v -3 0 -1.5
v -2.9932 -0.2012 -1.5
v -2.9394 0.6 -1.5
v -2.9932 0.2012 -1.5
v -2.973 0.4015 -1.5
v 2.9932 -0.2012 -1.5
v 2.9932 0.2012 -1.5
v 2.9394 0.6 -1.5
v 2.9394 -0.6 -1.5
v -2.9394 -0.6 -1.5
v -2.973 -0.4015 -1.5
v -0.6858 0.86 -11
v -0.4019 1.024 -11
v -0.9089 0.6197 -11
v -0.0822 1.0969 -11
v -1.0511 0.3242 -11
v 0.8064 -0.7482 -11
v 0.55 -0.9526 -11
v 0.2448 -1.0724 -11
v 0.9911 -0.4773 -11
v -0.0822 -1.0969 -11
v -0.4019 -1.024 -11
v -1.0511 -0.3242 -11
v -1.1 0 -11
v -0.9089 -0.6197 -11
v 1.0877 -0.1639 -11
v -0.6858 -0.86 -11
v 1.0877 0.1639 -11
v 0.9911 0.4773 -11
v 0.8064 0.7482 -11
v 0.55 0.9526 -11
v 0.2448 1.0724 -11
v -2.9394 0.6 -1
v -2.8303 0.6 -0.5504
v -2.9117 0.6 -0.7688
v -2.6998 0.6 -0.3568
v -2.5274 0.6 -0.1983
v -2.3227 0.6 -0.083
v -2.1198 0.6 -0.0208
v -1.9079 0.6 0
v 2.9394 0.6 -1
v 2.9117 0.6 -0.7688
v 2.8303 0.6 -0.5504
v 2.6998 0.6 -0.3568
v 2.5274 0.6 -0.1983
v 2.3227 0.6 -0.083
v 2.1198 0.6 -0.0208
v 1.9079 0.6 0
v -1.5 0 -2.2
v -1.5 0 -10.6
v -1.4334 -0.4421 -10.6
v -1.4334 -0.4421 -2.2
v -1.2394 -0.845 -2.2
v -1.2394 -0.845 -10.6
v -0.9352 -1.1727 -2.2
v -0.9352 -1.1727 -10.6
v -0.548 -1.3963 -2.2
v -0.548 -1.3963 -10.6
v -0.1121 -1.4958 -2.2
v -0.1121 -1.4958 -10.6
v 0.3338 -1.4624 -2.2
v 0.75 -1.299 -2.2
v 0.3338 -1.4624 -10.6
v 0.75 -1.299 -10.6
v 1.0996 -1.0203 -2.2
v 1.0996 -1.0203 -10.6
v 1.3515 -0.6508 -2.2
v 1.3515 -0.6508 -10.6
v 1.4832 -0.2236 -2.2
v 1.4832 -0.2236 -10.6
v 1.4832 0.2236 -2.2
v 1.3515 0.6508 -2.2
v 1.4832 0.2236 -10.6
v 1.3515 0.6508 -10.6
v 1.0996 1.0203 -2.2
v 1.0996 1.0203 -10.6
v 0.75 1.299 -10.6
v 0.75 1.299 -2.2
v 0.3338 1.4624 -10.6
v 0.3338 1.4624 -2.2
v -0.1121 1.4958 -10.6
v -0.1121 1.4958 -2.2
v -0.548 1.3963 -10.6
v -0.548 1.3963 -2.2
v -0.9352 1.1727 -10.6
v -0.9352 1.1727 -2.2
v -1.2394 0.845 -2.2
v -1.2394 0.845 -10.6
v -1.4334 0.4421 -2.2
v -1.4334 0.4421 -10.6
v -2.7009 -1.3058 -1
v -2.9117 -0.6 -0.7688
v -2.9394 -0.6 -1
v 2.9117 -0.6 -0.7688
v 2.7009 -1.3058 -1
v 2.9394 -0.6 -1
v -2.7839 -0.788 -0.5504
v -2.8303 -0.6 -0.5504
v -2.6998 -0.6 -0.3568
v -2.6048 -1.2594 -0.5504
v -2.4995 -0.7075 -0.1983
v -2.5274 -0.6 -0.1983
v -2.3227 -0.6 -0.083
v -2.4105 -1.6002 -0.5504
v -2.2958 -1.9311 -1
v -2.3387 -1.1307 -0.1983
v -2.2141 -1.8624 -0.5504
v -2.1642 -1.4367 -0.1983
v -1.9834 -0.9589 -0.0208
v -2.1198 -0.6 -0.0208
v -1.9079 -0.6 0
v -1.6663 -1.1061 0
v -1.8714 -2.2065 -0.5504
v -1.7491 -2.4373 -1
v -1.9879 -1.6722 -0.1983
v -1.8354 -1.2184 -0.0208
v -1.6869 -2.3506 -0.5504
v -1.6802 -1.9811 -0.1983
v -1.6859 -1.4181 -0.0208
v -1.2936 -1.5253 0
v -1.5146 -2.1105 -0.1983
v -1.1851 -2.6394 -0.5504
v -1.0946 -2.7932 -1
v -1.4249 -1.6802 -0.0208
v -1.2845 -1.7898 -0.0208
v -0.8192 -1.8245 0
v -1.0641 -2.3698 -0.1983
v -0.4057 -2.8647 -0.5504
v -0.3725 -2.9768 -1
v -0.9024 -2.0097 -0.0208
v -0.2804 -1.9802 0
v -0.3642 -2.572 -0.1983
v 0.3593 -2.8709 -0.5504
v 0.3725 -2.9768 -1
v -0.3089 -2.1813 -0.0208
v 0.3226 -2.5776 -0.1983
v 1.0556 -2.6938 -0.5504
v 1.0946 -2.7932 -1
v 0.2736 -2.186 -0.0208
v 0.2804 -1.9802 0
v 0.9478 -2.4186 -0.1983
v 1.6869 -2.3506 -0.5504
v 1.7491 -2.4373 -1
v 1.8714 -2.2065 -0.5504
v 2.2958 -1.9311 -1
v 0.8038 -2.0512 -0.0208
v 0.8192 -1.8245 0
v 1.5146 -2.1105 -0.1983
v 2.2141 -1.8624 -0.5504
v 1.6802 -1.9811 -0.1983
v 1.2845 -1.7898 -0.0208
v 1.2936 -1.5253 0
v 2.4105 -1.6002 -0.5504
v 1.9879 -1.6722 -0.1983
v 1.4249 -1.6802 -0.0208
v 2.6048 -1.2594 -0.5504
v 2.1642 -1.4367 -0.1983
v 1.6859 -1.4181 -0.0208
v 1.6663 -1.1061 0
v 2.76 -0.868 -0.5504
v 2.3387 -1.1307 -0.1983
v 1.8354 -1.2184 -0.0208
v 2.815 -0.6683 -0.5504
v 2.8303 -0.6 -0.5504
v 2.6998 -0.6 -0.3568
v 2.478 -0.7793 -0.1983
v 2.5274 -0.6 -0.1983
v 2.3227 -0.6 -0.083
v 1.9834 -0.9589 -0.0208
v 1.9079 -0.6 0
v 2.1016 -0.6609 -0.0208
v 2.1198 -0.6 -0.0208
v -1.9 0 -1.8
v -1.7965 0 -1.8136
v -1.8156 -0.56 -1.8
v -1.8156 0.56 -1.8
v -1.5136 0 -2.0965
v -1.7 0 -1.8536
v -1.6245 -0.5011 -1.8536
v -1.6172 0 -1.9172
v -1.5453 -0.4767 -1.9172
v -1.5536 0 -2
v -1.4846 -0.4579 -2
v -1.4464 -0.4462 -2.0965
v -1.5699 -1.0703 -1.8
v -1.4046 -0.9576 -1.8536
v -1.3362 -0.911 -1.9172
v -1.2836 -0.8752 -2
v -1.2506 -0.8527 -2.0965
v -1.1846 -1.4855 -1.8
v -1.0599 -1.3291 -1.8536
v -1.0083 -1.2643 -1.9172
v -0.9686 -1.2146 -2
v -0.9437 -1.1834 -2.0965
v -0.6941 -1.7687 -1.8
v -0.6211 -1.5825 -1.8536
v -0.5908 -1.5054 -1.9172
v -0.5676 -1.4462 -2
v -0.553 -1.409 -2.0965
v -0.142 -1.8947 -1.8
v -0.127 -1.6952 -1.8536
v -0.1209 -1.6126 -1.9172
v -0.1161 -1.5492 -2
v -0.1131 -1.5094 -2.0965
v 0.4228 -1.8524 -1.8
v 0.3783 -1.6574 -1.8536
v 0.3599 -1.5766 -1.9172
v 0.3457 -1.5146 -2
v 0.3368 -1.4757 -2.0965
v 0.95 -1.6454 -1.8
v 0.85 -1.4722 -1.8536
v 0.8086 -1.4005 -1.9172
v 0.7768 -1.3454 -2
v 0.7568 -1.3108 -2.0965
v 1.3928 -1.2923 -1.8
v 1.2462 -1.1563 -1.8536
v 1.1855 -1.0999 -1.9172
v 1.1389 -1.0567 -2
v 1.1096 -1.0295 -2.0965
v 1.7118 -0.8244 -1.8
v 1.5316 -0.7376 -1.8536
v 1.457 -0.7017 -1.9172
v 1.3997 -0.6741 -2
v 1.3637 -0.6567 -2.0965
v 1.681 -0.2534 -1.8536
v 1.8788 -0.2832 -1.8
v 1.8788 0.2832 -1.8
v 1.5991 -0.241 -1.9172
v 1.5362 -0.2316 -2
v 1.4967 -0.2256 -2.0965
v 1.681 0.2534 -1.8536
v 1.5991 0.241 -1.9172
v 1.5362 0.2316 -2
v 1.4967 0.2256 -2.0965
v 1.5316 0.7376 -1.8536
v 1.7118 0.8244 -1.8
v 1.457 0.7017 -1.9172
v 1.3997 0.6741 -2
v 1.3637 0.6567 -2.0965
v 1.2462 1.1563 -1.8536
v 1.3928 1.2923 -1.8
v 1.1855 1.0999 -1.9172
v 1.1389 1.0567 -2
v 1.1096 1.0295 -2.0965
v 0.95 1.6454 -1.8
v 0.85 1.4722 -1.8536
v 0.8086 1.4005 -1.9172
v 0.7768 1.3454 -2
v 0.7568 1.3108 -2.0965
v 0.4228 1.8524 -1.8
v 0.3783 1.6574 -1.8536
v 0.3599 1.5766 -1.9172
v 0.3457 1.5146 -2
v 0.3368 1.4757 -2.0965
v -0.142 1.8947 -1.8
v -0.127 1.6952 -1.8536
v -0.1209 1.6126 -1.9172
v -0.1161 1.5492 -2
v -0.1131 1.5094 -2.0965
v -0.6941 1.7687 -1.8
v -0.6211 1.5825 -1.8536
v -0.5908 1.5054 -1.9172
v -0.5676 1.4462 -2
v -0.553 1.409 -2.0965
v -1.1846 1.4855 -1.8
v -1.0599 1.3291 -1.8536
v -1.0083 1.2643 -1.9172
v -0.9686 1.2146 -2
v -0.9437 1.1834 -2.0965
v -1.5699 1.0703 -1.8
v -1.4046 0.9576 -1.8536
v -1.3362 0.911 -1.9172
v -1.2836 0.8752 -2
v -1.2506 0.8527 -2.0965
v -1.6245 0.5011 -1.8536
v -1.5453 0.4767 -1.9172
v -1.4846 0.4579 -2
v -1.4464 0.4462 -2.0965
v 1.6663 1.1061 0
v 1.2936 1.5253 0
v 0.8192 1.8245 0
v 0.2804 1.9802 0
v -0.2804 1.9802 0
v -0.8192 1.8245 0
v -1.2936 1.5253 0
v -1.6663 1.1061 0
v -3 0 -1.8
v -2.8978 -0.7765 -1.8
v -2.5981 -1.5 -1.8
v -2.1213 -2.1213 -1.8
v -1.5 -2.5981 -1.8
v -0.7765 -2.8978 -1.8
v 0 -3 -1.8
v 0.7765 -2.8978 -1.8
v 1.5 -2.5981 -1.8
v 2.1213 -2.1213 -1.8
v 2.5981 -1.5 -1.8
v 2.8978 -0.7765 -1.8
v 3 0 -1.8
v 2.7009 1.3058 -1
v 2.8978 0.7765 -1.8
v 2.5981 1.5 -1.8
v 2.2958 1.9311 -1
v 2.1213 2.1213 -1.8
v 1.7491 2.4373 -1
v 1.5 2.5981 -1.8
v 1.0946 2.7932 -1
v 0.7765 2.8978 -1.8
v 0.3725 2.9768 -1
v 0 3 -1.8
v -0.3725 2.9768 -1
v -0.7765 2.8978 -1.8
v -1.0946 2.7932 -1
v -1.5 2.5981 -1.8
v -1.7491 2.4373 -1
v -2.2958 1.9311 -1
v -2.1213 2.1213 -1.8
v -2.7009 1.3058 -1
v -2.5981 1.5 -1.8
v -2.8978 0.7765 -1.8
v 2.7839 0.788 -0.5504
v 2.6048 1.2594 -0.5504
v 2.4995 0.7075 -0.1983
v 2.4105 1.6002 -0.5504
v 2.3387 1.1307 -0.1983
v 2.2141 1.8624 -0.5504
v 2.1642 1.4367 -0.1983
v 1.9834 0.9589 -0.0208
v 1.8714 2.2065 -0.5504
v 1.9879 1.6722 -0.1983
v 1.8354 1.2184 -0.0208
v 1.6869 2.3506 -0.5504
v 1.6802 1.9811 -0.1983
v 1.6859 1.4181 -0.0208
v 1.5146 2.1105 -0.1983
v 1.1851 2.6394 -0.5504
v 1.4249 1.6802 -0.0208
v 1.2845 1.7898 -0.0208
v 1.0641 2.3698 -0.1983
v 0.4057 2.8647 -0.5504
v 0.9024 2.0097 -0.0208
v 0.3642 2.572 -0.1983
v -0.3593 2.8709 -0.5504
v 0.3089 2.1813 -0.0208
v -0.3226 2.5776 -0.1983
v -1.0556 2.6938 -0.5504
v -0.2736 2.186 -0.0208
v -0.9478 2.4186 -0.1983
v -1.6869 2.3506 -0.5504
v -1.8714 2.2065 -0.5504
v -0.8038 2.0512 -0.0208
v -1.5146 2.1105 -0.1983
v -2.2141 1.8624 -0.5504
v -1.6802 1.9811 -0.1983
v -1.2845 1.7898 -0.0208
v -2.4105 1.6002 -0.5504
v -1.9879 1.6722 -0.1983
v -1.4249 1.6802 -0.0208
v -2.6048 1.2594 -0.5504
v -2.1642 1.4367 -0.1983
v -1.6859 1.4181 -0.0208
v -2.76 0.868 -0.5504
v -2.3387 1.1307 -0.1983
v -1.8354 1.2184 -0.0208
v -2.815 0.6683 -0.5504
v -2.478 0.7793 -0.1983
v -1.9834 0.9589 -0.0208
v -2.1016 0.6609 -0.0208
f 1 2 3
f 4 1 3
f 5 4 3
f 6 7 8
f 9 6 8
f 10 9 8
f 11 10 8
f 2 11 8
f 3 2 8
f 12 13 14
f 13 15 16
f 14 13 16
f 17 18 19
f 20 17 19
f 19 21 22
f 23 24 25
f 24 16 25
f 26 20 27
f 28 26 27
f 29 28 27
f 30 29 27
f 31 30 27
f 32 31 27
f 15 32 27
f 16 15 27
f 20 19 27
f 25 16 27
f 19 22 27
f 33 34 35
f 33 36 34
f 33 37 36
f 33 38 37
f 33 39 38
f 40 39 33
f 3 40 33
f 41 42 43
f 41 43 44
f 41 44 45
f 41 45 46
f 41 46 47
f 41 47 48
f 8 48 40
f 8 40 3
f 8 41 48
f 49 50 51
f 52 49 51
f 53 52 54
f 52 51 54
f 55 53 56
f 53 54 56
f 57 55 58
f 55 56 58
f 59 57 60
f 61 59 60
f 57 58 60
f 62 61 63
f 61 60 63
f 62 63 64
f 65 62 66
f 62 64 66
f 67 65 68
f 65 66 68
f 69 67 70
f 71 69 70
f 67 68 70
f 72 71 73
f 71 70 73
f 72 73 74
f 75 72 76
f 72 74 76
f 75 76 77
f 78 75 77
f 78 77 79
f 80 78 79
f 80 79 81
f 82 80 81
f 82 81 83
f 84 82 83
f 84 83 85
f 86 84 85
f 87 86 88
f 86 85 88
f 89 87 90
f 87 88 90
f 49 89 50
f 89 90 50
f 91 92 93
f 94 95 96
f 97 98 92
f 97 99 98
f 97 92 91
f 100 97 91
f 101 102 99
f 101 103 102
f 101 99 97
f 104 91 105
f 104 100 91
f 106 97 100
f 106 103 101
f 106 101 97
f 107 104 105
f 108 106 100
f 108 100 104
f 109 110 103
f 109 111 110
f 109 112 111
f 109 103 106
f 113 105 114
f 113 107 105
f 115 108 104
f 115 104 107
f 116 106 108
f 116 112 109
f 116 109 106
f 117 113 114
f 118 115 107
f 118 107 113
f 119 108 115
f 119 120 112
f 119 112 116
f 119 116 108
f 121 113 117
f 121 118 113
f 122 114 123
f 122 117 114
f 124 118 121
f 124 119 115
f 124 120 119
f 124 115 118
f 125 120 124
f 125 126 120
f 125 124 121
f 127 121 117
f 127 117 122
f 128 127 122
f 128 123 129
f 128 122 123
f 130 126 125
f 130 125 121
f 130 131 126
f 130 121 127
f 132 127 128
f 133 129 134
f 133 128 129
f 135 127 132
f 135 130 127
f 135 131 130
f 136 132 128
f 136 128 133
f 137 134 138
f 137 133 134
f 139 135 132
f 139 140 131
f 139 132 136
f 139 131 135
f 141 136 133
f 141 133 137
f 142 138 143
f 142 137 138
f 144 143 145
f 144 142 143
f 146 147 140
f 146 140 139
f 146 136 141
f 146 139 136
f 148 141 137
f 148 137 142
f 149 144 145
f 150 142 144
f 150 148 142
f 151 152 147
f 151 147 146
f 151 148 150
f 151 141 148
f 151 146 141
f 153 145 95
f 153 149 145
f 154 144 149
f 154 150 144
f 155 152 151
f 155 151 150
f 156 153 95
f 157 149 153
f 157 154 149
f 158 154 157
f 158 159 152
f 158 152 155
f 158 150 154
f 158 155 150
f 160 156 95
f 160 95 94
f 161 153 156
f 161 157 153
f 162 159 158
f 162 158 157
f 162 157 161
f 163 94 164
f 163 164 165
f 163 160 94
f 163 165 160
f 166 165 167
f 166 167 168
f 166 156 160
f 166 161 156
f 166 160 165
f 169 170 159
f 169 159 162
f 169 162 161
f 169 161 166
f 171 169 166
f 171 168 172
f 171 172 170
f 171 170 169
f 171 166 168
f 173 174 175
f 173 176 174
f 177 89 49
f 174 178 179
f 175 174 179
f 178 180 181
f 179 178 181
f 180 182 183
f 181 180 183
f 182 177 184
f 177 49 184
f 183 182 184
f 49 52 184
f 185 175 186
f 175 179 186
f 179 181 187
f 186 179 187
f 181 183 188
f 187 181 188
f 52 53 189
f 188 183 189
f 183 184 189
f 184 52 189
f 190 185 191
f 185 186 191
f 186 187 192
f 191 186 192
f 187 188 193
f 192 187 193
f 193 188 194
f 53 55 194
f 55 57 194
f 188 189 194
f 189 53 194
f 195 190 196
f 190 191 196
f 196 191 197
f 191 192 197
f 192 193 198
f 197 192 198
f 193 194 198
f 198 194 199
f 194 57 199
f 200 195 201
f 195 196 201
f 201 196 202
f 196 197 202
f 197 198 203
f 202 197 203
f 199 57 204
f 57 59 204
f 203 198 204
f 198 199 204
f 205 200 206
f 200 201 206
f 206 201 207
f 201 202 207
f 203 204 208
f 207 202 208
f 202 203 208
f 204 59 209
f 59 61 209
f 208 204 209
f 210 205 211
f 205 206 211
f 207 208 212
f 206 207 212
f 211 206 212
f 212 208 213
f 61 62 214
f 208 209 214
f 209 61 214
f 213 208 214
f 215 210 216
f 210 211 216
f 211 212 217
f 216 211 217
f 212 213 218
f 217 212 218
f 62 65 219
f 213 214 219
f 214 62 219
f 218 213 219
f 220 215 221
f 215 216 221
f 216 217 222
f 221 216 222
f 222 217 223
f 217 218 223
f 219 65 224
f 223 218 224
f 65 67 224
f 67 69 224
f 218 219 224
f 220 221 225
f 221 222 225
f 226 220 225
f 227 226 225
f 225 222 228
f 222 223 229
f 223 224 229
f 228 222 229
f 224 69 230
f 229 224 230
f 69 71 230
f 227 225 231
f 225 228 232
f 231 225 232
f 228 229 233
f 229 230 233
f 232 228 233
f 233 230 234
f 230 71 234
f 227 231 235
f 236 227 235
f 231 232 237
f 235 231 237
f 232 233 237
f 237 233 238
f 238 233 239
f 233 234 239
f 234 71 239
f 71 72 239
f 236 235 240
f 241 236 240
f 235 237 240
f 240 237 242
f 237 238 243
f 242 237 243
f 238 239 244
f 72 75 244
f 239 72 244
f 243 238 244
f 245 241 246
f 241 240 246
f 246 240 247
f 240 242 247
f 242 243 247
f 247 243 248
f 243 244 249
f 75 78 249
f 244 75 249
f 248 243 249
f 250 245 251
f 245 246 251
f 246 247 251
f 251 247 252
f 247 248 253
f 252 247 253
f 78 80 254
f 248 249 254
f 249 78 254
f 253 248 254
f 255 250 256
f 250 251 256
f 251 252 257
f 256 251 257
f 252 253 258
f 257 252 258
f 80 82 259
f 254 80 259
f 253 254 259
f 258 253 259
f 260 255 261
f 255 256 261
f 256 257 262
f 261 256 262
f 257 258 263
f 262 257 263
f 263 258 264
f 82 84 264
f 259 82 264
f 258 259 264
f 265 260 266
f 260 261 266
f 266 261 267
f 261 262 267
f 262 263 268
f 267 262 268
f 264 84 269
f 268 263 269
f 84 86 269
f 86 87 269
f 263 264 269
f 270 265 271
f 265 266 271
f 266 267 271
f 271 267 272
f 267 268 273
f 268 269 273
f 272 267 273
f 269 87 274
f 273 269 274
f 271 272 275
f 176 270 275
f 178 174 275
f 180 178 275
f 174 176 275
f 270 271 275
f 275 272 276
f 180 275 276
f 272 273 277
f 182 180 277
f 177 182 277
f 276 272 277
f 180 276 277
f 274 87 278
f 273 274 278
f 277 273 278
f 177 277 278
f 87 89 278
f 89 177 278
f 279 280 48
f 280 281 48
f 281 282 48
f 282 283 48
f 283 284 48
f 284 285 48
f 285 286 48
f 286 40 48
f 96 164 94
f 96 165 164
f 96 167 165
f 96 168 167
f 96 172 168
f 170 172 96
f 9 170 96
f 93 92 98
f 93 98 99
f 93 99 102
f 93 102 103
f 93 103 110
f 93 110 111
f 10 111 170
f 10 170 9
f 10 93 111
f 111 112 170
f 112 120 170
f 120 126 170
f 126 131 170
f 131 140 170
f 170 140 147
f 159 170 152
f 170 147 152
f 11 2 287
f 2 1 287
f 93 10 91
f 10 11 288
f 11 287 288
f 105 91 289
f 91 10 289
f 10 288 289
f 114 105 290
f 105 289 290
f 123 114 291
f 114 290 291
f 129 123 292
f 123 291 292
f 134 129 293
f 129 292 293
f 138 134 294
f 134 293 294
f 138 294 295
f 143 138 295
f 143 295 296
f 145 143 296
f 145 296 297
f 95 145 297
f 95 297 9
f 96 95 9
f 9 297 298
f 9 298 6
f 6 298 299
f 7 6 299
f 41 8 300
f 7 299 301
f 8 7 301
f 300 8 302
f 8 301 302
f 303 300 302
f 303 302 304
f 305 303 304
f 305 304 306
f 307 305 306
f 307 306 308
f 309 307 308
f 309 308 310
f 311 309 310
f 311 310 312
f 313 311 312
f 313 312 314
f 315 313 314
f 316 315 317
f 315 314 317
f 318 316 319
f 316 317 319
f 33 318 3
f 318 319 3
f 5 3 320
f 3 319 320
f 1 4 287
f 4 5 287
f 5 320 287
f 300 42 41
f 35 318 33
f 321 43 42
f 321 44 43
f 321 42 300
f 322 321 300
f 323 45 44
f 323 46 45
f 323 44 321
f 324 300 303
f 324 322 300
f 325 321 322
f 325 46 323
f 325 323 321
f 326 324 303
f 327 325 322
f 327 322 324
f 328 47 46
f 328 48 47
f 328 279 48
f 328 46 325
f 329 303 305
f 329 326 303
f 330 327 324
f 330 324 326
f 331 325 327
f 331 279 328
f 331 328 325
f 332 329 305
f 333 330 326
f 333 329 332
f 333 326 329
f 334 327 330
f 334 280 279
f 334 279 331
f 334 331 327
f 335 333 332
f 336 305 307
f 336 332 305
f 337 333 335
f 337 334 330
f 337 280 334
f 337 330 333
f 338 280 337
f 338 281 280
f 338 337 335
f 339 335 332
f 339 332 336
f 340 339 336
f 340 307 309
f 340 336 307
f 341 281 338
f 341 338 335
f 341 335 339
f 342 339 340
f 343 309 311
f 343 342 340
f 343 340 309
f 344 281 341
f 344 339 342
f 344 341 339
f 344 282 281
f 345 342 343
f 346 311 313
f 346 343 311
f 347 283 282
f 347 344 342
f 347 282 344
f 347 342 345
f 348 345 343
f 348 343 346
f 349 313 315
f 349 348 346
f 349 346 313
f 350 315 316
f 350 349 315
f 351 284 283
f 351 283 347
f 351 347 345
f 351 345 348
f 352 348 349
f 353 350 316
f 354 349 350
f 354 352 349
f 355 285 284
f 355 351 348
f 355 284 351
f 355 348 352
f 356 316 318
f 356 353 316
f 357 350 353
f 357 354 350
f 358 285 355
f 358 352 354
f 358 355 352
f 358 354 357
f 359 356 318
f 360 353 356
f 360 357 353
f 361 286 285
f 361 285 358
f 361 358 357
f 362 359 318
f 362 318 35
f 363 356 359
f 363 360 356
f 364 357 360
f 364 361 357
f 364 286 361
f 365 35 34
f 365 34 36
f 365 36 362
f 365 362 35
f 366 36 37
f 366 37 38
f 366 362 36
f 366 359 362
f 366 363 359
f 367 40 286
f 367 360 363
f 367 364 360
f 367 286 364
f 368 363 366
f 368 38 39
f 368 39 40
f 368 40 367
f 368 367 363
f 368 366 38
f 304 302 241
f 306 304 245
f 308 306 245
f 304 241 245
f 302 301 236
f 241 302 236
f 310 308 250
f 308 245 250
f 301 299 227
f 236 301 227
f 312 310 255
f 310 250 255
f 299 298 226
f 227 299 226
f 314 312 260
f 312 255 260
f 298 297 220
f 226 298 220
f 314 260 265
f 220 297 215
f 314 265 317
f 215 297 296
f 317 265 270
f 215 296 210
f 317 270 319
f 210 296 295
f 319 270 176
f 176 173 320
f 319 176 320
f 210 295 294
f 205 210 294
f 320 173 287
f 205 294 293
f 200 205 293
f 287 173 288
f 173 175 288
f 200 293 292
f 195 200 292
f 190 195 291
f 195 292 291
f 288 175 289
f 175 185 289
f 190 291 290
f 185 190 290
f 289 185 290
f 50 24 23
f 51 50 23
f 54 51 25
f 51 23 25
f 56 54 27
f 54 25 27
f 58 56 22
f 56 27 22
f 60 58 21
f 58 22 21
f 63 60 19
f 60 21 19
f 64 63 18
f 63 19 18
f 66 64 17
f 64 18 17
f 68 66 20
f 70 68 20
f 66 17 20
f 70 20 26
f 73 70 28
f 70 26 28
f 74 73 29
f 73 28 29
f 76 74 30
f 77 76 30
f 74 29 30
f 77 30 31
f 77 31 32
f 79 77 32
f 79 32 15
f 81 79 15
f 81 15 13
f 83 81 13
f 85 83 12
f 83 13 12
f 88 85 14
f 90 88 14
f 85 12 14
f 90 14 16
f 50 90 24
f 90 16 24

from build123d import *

# Parameters (mm, degrees)
SKETCH_2_W               = 1.5
SKETCH_2_H               = 1.2
CUT_EXTRUDE_1_DEPTH      = 4
CUT_EXTRUDE_1_DEPTH_BACK = 4
CHAMFER_1_SIZE           = 0.4
FILLET_1_R               = 1
FILLET_2_R               = 0.4


with BuildPart() as part:
    # Эскиз1 → Повернуть1 (revolve)
    with BuildSketch(Plane(origin=(0, 0, 0), x_dir=(1, 0, 0), z_dir=(0, 1, 0))):
        Polygon((0, 0), (-3, 0), (-3, 1.8), (-1.5, 1.8), (-1.5, 11), (0, 11), align=None)
    revolve(axis=Axis((0, 0, -11), (0, 0, 1)))

    # Эскиз2 → Вырез-Вытянуть1 (cut, two sides)
    with BuildSketch(Plane(origin=(0, 0, 0), x_dir=(0, 0, -1), z_dir=(1, 0, 0))) as cut_extrude_1_sk:
        with Locations((0.75, 0)):
            Rectangle(SKETCH_2_W, SKETCH_2_H)
    extrude(amount=CUT_EXTRUDE_1_DEPTH, mode=Mode.SUBTRACT)
    extrude(cut_extrude_1_sk.sketch, amount=-CUT_EXTRUDE_1_DEPTH_BACK, mode=Mode.SUBTRACT)

    # Фаска1
    chamfer_1_edges = [part.edges().sort_by_distance(p)[0] for p in [
        (1.5, 0, -11),
    ]]
    chamfer(chamfer_1_edges, length=CHAMFER_1_SIZE)

    # Скругление1
    fillet_1_edges = [part.edges().sort_by_distance(p)[0] for p in [
        (0, 3, 0),
        (0, -3, 0),
    ]]
    fillet(fillet_1_edges, radius=FILLET_1_R)

    # Скругление2
    fillet_2_edges = [part.edges().sort_by_distance(p)[0] for p in [
        (1.5, 0, -1.8),
    ]]
    fillet(fillet_2_edges, radius=FILLET_2_R)


solid = part.part
